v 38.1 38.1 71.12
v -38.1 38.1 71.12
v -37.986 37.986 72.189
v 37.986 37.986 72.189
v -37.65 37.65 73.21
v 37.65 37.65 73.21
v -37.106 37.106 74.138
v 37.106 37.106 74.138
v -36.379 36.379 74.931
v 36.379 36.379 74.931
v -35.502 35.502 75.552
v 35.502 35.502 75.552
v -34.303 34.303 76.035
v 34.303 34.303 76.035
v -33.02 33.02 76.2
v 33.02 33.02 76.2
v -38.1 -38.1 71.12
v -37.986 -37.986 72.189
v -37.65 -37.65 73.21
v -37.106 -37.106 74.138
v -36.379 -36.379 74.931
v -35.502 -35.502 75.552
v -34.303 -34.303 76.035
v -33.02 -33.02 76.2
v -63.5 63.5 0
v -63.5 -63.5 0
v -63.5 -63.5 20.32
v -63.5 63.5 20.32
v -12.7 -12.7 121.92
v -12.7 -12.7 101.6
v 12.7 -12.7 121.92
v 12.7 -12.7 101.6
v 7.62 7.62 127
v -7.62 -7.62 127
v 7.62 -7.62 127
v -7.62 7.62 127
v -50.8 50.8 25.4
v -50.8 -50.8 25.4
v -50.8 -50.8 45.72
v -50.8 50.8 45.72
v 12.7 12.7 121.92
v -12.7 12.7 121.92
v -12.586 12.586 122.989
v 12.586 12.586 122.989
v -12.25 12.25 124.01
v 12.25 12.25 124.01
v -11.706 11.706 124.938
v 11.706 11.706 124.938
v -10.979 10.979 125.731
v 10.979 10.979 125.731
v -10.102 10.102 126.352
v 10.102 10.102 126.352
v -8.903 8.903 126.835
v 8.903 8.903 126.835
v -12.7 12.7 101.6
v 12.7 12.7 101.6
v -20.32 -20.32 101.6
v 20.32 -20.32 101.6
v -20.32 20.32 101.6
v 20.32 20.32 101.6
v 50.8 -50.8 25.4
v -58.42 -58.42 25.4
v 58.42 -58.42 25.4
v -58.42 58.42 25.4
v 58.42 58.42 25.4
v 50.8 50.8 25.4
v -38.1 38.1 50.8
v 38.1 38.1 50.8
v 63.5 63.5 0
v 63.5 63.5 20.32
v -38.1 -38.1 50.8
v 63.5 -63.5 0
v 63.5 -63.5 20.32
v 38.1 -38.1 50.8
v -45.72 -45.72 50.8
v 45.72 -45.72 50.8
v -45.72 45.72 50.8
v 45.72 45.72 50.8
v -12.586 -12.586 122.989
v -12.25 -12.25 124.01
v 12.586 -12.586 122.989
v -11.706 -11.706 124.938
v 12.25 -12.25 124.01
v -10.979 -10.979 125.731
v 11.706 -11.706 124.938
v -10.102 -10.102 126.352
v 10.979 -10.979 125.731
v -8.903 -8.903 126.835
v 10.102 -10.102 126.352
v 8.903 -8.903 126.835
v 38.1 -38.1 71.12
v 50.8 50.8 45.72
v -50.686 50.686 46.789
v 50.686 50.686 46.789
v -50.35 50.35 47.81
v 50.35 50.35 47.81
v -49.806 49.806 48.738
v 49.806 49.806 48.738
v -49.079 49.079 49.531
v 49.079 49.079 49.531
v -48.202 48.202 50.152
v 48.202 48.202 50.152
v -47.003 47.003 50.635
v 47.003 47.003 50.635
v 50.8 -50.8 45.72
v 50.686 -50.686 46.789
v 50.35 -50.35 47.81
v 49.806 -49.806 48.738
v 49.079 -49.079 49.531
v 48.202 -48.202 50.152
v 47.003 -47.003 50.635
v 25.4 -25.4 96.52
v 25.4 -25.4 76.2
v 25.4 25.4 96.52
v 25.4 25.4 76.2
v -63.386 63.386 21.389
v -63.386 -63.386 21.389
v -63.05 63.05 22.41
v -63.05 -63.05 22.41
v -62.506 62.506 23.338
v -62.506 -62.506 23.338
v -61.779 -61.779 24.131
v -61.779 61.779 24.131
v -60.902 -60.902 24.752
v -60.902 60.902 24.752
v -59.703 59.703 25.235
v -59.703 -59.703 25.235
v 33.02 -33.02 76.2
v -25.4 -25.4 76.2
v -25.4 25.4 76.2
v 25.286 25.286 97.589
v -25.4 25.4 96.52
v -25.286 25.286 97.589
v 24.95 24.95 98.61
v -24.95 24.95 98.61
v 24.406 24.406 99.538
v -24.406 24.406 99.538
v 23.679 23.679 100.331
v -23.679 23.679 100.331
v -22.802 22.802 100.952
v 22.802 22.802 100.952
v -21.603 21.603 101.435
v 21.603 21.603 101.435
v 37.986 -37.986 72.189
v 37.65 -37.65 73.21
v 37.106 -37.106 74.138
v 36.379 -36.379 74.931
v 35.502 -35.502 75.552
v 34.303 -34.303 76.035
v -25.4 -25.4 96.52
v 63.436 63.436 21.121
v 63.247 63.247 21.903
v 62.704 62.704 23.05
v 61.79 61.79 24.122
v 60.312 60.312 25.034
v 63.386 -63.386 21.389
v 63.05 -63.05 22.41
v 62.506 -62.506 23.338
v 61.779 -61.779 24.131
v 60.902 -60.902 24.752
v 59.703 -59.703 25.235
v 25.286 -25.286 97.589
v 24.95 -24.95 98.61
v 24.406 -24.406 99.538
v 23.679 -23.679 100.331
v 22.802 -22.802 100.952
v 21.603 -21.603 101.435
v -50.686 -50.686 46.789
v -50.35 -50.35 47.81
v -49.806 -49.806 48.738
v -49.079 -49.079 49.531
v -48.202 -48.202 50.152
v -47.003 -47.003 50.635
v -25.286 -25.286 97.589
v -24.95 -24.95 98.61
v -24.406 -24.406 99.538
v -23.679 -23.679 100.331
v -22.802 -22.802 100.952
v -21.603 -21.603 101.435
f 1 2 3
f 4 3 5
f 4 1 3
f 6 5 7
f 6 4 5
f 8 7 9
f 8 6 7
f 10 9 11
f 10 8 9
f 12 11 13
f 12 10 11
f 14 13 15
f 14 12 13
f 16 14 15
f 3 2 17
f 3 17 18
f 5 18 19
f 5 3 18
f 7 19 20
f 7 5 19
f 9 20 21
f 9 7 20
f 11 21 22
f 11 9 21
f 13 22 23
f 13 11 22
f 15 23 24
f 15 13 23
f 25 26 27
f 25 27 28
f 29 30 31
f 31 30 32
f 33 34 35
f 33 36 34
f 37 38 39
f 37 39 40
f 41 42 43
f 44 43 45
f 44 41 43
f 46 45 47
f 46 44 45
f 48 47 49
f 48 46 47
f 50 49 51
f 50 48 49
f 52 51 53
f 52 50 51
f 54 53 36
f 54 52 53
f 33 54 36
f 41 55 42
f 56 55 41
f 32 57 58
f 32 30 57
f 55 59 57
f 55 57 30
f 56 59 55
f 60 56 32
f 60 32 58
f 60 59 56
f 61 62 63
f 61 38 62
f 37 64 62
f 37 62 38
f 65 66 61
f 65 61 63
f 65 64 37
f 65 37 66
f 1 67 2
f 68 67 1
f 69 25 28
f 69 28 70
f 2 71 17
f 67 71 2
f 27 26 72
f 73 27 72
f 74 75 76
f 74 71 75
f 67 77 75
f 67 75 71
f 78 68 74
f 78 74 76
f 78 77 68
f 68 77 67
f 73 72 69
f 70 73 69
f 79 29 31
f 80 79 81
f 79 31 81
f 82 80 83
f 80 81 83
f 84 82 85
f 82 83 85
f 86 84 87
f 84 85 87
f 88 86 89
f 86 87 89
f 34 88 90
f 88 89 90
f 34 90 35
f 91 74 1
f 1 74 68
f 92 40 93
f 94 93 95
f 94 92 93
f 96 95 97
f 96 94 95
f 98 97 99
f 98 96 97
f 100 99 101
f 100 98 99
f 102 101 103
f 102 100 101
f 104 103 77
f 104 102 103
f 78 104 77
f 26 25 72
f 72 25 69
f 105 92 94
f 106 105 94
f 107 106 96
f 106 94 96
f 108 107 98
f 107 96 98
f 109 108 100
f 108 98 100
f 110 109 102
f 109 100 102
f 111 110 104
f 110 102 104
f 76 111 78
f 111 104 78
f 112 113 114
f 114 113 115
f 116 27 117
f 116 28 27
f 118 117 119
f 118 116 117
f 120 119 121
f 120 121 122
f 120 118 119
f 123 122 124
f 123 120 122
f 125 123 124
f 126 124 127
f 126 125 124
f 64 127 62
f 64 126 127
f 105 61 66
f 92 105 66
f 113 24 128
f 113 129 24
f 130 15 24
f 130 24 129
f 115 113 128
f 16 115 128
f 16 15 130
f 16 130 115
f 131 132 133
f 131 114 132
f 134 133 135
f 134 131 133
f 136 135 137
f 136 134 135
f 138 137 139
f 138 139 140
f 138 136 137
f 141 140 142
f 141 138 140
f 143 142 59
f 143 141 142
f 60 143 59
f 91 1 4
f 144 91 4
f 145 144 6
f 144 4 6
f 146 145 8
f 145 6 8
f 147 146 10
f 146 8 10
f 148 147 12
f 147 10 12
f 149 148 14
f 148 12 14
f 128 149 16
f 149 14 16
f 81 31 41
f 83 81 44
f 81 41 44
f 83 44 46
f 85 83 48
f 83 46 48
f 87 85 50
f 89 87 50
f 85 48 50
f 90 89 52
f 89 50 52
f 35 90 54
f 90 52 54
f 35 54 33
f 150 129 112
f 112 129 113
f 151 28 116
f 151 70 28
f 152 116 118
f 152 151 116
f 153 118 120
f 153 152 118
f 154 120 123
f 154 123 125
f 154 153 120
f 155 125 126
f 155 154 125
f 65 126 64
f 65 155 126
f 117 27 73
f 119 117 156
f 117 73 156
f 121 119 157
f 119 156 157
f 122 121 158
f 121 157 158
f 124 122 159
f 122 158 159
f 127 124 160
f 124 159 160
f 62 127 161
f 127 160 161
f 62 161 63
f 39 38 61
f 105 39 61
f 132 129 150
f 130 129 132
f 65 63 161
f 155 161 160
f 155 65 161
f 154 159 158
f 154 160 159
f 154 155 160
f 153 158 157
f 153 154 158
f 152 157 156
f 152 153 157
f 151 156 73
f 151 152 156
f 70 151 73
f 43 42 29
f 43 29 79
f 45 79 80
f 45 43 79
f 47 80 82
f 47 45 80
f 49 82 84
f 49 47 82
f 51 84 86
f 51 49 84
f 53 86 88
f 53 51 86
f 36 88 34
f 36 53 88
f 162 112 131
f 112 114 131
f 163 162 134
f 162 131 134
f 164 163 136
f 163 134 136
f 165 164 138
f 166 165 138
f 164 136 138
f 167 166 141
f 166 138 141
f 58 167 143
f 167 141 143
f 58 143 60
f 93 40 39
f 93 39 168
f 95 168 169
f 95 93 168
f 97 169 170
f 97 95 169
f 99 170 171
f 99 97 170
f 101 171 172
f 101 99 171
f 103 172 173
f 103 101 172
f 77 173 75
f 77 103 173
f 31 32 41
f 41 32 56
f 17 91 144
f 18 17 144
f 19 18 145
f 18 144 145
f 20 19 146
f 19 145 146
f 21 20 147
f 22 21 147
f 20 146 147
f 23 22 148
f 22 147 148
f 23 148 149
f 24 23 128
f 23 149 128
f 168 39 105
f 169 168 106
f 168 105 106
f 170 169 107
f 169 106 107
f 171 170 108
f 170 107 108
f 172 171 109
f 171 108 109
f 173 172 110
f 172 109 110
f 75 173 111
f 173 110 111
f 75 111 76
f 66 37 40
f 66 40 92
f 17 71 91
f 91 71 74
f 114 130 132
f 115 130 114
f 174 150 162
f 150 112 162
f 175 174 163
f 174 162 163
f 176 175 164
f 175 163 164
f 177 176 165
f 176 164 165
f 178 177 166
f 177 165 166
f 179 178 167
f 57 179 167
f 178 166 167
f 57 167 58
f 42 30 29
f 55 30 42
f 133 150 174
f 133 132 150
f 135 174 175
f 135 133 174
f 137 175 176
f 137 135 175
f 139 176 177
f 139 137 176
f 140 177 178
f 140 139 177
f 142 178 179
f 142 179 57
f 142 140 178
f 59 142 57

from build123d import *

# Parameters (mm, degrees)
F0_W     = 25.4
F0_H     = 25.4
F1_DEPTH = 127
F2_W     = 50.8
F2_H     = 50.8
F3_DEPTH = 101.6
F4_W     = 76.2
F4_H     = 76.2
F5_DEPTH = 76.2
F6_W     = 101.6
F6_H     = 101.6
F7_DEPTH = 50.8
F8_W     = 127
F8_H     = 127
F9_DEPTH = 25.4
F10_R    = 5.08


with BuildPart() as f1:
    # F0 (on Top) → F1 (new body)
    with BuildSketch(Plane.XY):
        Rectangle(F0_W, F0_H)
    extrude(amount=F1_DEPTH)

    # F2 (on Top) → F3 (join)
    with BuildSketch(Plane.XY):
        Rectangle(F2_W, F2_H)
    extrude(amount=F3_DEPTH)

    # F4 (on Top) → F5 (join)
    with BuildSketch(Plane.XY):
        Rectangle(F4_W, F4_H)
    extrude(amount=F5_DEPTH)

    # F6 (on Top) → F7 (join)
    with BuildSketch(Plane.XY):
        Rectangle(F6_W, F6_H)
    extrude(amount=F7_DEPTH)

    # F8 (on Top) → F9 (join)
    with BuildSketch(Plane.XY):
        Rectangle(F8_W, F8_H)
    extrude(amount=F9_DEPTH)

    # F10
    f10_edges = [f1.edges().sort_by_distance(p)[0] for p in [
        (0, -12.7, 127),
        (0, -25.4, 101.6),
        (0, -38.1, 76.2),
        (0, -50.8, 50.8),
        (0, -63.5, 25.4),
        (12.7, 0, 127),
        (0, 12.7, 127),
        (-12.7, 0, 127),
        (25.4, 0, 101.6),
        (0, 25.4, 101.6),
        (-25.4, 0, 101.6),
        (38.1, 0, 76.2),
        (0, 38.1, 76.2),
        (-38.1, 0, 76.2),
        (-50.8, 0, 50.8),
        (-63.5, 0, 25.4),
        (50.8, 0, 50.8),
        (63.5, 0, 25.4),
        (0, 50.8, 50.8),
        (0, 63.5, 25.4),
    ]]
    fillet(f10_edges, radius=F10_R)


solid = f1.part
